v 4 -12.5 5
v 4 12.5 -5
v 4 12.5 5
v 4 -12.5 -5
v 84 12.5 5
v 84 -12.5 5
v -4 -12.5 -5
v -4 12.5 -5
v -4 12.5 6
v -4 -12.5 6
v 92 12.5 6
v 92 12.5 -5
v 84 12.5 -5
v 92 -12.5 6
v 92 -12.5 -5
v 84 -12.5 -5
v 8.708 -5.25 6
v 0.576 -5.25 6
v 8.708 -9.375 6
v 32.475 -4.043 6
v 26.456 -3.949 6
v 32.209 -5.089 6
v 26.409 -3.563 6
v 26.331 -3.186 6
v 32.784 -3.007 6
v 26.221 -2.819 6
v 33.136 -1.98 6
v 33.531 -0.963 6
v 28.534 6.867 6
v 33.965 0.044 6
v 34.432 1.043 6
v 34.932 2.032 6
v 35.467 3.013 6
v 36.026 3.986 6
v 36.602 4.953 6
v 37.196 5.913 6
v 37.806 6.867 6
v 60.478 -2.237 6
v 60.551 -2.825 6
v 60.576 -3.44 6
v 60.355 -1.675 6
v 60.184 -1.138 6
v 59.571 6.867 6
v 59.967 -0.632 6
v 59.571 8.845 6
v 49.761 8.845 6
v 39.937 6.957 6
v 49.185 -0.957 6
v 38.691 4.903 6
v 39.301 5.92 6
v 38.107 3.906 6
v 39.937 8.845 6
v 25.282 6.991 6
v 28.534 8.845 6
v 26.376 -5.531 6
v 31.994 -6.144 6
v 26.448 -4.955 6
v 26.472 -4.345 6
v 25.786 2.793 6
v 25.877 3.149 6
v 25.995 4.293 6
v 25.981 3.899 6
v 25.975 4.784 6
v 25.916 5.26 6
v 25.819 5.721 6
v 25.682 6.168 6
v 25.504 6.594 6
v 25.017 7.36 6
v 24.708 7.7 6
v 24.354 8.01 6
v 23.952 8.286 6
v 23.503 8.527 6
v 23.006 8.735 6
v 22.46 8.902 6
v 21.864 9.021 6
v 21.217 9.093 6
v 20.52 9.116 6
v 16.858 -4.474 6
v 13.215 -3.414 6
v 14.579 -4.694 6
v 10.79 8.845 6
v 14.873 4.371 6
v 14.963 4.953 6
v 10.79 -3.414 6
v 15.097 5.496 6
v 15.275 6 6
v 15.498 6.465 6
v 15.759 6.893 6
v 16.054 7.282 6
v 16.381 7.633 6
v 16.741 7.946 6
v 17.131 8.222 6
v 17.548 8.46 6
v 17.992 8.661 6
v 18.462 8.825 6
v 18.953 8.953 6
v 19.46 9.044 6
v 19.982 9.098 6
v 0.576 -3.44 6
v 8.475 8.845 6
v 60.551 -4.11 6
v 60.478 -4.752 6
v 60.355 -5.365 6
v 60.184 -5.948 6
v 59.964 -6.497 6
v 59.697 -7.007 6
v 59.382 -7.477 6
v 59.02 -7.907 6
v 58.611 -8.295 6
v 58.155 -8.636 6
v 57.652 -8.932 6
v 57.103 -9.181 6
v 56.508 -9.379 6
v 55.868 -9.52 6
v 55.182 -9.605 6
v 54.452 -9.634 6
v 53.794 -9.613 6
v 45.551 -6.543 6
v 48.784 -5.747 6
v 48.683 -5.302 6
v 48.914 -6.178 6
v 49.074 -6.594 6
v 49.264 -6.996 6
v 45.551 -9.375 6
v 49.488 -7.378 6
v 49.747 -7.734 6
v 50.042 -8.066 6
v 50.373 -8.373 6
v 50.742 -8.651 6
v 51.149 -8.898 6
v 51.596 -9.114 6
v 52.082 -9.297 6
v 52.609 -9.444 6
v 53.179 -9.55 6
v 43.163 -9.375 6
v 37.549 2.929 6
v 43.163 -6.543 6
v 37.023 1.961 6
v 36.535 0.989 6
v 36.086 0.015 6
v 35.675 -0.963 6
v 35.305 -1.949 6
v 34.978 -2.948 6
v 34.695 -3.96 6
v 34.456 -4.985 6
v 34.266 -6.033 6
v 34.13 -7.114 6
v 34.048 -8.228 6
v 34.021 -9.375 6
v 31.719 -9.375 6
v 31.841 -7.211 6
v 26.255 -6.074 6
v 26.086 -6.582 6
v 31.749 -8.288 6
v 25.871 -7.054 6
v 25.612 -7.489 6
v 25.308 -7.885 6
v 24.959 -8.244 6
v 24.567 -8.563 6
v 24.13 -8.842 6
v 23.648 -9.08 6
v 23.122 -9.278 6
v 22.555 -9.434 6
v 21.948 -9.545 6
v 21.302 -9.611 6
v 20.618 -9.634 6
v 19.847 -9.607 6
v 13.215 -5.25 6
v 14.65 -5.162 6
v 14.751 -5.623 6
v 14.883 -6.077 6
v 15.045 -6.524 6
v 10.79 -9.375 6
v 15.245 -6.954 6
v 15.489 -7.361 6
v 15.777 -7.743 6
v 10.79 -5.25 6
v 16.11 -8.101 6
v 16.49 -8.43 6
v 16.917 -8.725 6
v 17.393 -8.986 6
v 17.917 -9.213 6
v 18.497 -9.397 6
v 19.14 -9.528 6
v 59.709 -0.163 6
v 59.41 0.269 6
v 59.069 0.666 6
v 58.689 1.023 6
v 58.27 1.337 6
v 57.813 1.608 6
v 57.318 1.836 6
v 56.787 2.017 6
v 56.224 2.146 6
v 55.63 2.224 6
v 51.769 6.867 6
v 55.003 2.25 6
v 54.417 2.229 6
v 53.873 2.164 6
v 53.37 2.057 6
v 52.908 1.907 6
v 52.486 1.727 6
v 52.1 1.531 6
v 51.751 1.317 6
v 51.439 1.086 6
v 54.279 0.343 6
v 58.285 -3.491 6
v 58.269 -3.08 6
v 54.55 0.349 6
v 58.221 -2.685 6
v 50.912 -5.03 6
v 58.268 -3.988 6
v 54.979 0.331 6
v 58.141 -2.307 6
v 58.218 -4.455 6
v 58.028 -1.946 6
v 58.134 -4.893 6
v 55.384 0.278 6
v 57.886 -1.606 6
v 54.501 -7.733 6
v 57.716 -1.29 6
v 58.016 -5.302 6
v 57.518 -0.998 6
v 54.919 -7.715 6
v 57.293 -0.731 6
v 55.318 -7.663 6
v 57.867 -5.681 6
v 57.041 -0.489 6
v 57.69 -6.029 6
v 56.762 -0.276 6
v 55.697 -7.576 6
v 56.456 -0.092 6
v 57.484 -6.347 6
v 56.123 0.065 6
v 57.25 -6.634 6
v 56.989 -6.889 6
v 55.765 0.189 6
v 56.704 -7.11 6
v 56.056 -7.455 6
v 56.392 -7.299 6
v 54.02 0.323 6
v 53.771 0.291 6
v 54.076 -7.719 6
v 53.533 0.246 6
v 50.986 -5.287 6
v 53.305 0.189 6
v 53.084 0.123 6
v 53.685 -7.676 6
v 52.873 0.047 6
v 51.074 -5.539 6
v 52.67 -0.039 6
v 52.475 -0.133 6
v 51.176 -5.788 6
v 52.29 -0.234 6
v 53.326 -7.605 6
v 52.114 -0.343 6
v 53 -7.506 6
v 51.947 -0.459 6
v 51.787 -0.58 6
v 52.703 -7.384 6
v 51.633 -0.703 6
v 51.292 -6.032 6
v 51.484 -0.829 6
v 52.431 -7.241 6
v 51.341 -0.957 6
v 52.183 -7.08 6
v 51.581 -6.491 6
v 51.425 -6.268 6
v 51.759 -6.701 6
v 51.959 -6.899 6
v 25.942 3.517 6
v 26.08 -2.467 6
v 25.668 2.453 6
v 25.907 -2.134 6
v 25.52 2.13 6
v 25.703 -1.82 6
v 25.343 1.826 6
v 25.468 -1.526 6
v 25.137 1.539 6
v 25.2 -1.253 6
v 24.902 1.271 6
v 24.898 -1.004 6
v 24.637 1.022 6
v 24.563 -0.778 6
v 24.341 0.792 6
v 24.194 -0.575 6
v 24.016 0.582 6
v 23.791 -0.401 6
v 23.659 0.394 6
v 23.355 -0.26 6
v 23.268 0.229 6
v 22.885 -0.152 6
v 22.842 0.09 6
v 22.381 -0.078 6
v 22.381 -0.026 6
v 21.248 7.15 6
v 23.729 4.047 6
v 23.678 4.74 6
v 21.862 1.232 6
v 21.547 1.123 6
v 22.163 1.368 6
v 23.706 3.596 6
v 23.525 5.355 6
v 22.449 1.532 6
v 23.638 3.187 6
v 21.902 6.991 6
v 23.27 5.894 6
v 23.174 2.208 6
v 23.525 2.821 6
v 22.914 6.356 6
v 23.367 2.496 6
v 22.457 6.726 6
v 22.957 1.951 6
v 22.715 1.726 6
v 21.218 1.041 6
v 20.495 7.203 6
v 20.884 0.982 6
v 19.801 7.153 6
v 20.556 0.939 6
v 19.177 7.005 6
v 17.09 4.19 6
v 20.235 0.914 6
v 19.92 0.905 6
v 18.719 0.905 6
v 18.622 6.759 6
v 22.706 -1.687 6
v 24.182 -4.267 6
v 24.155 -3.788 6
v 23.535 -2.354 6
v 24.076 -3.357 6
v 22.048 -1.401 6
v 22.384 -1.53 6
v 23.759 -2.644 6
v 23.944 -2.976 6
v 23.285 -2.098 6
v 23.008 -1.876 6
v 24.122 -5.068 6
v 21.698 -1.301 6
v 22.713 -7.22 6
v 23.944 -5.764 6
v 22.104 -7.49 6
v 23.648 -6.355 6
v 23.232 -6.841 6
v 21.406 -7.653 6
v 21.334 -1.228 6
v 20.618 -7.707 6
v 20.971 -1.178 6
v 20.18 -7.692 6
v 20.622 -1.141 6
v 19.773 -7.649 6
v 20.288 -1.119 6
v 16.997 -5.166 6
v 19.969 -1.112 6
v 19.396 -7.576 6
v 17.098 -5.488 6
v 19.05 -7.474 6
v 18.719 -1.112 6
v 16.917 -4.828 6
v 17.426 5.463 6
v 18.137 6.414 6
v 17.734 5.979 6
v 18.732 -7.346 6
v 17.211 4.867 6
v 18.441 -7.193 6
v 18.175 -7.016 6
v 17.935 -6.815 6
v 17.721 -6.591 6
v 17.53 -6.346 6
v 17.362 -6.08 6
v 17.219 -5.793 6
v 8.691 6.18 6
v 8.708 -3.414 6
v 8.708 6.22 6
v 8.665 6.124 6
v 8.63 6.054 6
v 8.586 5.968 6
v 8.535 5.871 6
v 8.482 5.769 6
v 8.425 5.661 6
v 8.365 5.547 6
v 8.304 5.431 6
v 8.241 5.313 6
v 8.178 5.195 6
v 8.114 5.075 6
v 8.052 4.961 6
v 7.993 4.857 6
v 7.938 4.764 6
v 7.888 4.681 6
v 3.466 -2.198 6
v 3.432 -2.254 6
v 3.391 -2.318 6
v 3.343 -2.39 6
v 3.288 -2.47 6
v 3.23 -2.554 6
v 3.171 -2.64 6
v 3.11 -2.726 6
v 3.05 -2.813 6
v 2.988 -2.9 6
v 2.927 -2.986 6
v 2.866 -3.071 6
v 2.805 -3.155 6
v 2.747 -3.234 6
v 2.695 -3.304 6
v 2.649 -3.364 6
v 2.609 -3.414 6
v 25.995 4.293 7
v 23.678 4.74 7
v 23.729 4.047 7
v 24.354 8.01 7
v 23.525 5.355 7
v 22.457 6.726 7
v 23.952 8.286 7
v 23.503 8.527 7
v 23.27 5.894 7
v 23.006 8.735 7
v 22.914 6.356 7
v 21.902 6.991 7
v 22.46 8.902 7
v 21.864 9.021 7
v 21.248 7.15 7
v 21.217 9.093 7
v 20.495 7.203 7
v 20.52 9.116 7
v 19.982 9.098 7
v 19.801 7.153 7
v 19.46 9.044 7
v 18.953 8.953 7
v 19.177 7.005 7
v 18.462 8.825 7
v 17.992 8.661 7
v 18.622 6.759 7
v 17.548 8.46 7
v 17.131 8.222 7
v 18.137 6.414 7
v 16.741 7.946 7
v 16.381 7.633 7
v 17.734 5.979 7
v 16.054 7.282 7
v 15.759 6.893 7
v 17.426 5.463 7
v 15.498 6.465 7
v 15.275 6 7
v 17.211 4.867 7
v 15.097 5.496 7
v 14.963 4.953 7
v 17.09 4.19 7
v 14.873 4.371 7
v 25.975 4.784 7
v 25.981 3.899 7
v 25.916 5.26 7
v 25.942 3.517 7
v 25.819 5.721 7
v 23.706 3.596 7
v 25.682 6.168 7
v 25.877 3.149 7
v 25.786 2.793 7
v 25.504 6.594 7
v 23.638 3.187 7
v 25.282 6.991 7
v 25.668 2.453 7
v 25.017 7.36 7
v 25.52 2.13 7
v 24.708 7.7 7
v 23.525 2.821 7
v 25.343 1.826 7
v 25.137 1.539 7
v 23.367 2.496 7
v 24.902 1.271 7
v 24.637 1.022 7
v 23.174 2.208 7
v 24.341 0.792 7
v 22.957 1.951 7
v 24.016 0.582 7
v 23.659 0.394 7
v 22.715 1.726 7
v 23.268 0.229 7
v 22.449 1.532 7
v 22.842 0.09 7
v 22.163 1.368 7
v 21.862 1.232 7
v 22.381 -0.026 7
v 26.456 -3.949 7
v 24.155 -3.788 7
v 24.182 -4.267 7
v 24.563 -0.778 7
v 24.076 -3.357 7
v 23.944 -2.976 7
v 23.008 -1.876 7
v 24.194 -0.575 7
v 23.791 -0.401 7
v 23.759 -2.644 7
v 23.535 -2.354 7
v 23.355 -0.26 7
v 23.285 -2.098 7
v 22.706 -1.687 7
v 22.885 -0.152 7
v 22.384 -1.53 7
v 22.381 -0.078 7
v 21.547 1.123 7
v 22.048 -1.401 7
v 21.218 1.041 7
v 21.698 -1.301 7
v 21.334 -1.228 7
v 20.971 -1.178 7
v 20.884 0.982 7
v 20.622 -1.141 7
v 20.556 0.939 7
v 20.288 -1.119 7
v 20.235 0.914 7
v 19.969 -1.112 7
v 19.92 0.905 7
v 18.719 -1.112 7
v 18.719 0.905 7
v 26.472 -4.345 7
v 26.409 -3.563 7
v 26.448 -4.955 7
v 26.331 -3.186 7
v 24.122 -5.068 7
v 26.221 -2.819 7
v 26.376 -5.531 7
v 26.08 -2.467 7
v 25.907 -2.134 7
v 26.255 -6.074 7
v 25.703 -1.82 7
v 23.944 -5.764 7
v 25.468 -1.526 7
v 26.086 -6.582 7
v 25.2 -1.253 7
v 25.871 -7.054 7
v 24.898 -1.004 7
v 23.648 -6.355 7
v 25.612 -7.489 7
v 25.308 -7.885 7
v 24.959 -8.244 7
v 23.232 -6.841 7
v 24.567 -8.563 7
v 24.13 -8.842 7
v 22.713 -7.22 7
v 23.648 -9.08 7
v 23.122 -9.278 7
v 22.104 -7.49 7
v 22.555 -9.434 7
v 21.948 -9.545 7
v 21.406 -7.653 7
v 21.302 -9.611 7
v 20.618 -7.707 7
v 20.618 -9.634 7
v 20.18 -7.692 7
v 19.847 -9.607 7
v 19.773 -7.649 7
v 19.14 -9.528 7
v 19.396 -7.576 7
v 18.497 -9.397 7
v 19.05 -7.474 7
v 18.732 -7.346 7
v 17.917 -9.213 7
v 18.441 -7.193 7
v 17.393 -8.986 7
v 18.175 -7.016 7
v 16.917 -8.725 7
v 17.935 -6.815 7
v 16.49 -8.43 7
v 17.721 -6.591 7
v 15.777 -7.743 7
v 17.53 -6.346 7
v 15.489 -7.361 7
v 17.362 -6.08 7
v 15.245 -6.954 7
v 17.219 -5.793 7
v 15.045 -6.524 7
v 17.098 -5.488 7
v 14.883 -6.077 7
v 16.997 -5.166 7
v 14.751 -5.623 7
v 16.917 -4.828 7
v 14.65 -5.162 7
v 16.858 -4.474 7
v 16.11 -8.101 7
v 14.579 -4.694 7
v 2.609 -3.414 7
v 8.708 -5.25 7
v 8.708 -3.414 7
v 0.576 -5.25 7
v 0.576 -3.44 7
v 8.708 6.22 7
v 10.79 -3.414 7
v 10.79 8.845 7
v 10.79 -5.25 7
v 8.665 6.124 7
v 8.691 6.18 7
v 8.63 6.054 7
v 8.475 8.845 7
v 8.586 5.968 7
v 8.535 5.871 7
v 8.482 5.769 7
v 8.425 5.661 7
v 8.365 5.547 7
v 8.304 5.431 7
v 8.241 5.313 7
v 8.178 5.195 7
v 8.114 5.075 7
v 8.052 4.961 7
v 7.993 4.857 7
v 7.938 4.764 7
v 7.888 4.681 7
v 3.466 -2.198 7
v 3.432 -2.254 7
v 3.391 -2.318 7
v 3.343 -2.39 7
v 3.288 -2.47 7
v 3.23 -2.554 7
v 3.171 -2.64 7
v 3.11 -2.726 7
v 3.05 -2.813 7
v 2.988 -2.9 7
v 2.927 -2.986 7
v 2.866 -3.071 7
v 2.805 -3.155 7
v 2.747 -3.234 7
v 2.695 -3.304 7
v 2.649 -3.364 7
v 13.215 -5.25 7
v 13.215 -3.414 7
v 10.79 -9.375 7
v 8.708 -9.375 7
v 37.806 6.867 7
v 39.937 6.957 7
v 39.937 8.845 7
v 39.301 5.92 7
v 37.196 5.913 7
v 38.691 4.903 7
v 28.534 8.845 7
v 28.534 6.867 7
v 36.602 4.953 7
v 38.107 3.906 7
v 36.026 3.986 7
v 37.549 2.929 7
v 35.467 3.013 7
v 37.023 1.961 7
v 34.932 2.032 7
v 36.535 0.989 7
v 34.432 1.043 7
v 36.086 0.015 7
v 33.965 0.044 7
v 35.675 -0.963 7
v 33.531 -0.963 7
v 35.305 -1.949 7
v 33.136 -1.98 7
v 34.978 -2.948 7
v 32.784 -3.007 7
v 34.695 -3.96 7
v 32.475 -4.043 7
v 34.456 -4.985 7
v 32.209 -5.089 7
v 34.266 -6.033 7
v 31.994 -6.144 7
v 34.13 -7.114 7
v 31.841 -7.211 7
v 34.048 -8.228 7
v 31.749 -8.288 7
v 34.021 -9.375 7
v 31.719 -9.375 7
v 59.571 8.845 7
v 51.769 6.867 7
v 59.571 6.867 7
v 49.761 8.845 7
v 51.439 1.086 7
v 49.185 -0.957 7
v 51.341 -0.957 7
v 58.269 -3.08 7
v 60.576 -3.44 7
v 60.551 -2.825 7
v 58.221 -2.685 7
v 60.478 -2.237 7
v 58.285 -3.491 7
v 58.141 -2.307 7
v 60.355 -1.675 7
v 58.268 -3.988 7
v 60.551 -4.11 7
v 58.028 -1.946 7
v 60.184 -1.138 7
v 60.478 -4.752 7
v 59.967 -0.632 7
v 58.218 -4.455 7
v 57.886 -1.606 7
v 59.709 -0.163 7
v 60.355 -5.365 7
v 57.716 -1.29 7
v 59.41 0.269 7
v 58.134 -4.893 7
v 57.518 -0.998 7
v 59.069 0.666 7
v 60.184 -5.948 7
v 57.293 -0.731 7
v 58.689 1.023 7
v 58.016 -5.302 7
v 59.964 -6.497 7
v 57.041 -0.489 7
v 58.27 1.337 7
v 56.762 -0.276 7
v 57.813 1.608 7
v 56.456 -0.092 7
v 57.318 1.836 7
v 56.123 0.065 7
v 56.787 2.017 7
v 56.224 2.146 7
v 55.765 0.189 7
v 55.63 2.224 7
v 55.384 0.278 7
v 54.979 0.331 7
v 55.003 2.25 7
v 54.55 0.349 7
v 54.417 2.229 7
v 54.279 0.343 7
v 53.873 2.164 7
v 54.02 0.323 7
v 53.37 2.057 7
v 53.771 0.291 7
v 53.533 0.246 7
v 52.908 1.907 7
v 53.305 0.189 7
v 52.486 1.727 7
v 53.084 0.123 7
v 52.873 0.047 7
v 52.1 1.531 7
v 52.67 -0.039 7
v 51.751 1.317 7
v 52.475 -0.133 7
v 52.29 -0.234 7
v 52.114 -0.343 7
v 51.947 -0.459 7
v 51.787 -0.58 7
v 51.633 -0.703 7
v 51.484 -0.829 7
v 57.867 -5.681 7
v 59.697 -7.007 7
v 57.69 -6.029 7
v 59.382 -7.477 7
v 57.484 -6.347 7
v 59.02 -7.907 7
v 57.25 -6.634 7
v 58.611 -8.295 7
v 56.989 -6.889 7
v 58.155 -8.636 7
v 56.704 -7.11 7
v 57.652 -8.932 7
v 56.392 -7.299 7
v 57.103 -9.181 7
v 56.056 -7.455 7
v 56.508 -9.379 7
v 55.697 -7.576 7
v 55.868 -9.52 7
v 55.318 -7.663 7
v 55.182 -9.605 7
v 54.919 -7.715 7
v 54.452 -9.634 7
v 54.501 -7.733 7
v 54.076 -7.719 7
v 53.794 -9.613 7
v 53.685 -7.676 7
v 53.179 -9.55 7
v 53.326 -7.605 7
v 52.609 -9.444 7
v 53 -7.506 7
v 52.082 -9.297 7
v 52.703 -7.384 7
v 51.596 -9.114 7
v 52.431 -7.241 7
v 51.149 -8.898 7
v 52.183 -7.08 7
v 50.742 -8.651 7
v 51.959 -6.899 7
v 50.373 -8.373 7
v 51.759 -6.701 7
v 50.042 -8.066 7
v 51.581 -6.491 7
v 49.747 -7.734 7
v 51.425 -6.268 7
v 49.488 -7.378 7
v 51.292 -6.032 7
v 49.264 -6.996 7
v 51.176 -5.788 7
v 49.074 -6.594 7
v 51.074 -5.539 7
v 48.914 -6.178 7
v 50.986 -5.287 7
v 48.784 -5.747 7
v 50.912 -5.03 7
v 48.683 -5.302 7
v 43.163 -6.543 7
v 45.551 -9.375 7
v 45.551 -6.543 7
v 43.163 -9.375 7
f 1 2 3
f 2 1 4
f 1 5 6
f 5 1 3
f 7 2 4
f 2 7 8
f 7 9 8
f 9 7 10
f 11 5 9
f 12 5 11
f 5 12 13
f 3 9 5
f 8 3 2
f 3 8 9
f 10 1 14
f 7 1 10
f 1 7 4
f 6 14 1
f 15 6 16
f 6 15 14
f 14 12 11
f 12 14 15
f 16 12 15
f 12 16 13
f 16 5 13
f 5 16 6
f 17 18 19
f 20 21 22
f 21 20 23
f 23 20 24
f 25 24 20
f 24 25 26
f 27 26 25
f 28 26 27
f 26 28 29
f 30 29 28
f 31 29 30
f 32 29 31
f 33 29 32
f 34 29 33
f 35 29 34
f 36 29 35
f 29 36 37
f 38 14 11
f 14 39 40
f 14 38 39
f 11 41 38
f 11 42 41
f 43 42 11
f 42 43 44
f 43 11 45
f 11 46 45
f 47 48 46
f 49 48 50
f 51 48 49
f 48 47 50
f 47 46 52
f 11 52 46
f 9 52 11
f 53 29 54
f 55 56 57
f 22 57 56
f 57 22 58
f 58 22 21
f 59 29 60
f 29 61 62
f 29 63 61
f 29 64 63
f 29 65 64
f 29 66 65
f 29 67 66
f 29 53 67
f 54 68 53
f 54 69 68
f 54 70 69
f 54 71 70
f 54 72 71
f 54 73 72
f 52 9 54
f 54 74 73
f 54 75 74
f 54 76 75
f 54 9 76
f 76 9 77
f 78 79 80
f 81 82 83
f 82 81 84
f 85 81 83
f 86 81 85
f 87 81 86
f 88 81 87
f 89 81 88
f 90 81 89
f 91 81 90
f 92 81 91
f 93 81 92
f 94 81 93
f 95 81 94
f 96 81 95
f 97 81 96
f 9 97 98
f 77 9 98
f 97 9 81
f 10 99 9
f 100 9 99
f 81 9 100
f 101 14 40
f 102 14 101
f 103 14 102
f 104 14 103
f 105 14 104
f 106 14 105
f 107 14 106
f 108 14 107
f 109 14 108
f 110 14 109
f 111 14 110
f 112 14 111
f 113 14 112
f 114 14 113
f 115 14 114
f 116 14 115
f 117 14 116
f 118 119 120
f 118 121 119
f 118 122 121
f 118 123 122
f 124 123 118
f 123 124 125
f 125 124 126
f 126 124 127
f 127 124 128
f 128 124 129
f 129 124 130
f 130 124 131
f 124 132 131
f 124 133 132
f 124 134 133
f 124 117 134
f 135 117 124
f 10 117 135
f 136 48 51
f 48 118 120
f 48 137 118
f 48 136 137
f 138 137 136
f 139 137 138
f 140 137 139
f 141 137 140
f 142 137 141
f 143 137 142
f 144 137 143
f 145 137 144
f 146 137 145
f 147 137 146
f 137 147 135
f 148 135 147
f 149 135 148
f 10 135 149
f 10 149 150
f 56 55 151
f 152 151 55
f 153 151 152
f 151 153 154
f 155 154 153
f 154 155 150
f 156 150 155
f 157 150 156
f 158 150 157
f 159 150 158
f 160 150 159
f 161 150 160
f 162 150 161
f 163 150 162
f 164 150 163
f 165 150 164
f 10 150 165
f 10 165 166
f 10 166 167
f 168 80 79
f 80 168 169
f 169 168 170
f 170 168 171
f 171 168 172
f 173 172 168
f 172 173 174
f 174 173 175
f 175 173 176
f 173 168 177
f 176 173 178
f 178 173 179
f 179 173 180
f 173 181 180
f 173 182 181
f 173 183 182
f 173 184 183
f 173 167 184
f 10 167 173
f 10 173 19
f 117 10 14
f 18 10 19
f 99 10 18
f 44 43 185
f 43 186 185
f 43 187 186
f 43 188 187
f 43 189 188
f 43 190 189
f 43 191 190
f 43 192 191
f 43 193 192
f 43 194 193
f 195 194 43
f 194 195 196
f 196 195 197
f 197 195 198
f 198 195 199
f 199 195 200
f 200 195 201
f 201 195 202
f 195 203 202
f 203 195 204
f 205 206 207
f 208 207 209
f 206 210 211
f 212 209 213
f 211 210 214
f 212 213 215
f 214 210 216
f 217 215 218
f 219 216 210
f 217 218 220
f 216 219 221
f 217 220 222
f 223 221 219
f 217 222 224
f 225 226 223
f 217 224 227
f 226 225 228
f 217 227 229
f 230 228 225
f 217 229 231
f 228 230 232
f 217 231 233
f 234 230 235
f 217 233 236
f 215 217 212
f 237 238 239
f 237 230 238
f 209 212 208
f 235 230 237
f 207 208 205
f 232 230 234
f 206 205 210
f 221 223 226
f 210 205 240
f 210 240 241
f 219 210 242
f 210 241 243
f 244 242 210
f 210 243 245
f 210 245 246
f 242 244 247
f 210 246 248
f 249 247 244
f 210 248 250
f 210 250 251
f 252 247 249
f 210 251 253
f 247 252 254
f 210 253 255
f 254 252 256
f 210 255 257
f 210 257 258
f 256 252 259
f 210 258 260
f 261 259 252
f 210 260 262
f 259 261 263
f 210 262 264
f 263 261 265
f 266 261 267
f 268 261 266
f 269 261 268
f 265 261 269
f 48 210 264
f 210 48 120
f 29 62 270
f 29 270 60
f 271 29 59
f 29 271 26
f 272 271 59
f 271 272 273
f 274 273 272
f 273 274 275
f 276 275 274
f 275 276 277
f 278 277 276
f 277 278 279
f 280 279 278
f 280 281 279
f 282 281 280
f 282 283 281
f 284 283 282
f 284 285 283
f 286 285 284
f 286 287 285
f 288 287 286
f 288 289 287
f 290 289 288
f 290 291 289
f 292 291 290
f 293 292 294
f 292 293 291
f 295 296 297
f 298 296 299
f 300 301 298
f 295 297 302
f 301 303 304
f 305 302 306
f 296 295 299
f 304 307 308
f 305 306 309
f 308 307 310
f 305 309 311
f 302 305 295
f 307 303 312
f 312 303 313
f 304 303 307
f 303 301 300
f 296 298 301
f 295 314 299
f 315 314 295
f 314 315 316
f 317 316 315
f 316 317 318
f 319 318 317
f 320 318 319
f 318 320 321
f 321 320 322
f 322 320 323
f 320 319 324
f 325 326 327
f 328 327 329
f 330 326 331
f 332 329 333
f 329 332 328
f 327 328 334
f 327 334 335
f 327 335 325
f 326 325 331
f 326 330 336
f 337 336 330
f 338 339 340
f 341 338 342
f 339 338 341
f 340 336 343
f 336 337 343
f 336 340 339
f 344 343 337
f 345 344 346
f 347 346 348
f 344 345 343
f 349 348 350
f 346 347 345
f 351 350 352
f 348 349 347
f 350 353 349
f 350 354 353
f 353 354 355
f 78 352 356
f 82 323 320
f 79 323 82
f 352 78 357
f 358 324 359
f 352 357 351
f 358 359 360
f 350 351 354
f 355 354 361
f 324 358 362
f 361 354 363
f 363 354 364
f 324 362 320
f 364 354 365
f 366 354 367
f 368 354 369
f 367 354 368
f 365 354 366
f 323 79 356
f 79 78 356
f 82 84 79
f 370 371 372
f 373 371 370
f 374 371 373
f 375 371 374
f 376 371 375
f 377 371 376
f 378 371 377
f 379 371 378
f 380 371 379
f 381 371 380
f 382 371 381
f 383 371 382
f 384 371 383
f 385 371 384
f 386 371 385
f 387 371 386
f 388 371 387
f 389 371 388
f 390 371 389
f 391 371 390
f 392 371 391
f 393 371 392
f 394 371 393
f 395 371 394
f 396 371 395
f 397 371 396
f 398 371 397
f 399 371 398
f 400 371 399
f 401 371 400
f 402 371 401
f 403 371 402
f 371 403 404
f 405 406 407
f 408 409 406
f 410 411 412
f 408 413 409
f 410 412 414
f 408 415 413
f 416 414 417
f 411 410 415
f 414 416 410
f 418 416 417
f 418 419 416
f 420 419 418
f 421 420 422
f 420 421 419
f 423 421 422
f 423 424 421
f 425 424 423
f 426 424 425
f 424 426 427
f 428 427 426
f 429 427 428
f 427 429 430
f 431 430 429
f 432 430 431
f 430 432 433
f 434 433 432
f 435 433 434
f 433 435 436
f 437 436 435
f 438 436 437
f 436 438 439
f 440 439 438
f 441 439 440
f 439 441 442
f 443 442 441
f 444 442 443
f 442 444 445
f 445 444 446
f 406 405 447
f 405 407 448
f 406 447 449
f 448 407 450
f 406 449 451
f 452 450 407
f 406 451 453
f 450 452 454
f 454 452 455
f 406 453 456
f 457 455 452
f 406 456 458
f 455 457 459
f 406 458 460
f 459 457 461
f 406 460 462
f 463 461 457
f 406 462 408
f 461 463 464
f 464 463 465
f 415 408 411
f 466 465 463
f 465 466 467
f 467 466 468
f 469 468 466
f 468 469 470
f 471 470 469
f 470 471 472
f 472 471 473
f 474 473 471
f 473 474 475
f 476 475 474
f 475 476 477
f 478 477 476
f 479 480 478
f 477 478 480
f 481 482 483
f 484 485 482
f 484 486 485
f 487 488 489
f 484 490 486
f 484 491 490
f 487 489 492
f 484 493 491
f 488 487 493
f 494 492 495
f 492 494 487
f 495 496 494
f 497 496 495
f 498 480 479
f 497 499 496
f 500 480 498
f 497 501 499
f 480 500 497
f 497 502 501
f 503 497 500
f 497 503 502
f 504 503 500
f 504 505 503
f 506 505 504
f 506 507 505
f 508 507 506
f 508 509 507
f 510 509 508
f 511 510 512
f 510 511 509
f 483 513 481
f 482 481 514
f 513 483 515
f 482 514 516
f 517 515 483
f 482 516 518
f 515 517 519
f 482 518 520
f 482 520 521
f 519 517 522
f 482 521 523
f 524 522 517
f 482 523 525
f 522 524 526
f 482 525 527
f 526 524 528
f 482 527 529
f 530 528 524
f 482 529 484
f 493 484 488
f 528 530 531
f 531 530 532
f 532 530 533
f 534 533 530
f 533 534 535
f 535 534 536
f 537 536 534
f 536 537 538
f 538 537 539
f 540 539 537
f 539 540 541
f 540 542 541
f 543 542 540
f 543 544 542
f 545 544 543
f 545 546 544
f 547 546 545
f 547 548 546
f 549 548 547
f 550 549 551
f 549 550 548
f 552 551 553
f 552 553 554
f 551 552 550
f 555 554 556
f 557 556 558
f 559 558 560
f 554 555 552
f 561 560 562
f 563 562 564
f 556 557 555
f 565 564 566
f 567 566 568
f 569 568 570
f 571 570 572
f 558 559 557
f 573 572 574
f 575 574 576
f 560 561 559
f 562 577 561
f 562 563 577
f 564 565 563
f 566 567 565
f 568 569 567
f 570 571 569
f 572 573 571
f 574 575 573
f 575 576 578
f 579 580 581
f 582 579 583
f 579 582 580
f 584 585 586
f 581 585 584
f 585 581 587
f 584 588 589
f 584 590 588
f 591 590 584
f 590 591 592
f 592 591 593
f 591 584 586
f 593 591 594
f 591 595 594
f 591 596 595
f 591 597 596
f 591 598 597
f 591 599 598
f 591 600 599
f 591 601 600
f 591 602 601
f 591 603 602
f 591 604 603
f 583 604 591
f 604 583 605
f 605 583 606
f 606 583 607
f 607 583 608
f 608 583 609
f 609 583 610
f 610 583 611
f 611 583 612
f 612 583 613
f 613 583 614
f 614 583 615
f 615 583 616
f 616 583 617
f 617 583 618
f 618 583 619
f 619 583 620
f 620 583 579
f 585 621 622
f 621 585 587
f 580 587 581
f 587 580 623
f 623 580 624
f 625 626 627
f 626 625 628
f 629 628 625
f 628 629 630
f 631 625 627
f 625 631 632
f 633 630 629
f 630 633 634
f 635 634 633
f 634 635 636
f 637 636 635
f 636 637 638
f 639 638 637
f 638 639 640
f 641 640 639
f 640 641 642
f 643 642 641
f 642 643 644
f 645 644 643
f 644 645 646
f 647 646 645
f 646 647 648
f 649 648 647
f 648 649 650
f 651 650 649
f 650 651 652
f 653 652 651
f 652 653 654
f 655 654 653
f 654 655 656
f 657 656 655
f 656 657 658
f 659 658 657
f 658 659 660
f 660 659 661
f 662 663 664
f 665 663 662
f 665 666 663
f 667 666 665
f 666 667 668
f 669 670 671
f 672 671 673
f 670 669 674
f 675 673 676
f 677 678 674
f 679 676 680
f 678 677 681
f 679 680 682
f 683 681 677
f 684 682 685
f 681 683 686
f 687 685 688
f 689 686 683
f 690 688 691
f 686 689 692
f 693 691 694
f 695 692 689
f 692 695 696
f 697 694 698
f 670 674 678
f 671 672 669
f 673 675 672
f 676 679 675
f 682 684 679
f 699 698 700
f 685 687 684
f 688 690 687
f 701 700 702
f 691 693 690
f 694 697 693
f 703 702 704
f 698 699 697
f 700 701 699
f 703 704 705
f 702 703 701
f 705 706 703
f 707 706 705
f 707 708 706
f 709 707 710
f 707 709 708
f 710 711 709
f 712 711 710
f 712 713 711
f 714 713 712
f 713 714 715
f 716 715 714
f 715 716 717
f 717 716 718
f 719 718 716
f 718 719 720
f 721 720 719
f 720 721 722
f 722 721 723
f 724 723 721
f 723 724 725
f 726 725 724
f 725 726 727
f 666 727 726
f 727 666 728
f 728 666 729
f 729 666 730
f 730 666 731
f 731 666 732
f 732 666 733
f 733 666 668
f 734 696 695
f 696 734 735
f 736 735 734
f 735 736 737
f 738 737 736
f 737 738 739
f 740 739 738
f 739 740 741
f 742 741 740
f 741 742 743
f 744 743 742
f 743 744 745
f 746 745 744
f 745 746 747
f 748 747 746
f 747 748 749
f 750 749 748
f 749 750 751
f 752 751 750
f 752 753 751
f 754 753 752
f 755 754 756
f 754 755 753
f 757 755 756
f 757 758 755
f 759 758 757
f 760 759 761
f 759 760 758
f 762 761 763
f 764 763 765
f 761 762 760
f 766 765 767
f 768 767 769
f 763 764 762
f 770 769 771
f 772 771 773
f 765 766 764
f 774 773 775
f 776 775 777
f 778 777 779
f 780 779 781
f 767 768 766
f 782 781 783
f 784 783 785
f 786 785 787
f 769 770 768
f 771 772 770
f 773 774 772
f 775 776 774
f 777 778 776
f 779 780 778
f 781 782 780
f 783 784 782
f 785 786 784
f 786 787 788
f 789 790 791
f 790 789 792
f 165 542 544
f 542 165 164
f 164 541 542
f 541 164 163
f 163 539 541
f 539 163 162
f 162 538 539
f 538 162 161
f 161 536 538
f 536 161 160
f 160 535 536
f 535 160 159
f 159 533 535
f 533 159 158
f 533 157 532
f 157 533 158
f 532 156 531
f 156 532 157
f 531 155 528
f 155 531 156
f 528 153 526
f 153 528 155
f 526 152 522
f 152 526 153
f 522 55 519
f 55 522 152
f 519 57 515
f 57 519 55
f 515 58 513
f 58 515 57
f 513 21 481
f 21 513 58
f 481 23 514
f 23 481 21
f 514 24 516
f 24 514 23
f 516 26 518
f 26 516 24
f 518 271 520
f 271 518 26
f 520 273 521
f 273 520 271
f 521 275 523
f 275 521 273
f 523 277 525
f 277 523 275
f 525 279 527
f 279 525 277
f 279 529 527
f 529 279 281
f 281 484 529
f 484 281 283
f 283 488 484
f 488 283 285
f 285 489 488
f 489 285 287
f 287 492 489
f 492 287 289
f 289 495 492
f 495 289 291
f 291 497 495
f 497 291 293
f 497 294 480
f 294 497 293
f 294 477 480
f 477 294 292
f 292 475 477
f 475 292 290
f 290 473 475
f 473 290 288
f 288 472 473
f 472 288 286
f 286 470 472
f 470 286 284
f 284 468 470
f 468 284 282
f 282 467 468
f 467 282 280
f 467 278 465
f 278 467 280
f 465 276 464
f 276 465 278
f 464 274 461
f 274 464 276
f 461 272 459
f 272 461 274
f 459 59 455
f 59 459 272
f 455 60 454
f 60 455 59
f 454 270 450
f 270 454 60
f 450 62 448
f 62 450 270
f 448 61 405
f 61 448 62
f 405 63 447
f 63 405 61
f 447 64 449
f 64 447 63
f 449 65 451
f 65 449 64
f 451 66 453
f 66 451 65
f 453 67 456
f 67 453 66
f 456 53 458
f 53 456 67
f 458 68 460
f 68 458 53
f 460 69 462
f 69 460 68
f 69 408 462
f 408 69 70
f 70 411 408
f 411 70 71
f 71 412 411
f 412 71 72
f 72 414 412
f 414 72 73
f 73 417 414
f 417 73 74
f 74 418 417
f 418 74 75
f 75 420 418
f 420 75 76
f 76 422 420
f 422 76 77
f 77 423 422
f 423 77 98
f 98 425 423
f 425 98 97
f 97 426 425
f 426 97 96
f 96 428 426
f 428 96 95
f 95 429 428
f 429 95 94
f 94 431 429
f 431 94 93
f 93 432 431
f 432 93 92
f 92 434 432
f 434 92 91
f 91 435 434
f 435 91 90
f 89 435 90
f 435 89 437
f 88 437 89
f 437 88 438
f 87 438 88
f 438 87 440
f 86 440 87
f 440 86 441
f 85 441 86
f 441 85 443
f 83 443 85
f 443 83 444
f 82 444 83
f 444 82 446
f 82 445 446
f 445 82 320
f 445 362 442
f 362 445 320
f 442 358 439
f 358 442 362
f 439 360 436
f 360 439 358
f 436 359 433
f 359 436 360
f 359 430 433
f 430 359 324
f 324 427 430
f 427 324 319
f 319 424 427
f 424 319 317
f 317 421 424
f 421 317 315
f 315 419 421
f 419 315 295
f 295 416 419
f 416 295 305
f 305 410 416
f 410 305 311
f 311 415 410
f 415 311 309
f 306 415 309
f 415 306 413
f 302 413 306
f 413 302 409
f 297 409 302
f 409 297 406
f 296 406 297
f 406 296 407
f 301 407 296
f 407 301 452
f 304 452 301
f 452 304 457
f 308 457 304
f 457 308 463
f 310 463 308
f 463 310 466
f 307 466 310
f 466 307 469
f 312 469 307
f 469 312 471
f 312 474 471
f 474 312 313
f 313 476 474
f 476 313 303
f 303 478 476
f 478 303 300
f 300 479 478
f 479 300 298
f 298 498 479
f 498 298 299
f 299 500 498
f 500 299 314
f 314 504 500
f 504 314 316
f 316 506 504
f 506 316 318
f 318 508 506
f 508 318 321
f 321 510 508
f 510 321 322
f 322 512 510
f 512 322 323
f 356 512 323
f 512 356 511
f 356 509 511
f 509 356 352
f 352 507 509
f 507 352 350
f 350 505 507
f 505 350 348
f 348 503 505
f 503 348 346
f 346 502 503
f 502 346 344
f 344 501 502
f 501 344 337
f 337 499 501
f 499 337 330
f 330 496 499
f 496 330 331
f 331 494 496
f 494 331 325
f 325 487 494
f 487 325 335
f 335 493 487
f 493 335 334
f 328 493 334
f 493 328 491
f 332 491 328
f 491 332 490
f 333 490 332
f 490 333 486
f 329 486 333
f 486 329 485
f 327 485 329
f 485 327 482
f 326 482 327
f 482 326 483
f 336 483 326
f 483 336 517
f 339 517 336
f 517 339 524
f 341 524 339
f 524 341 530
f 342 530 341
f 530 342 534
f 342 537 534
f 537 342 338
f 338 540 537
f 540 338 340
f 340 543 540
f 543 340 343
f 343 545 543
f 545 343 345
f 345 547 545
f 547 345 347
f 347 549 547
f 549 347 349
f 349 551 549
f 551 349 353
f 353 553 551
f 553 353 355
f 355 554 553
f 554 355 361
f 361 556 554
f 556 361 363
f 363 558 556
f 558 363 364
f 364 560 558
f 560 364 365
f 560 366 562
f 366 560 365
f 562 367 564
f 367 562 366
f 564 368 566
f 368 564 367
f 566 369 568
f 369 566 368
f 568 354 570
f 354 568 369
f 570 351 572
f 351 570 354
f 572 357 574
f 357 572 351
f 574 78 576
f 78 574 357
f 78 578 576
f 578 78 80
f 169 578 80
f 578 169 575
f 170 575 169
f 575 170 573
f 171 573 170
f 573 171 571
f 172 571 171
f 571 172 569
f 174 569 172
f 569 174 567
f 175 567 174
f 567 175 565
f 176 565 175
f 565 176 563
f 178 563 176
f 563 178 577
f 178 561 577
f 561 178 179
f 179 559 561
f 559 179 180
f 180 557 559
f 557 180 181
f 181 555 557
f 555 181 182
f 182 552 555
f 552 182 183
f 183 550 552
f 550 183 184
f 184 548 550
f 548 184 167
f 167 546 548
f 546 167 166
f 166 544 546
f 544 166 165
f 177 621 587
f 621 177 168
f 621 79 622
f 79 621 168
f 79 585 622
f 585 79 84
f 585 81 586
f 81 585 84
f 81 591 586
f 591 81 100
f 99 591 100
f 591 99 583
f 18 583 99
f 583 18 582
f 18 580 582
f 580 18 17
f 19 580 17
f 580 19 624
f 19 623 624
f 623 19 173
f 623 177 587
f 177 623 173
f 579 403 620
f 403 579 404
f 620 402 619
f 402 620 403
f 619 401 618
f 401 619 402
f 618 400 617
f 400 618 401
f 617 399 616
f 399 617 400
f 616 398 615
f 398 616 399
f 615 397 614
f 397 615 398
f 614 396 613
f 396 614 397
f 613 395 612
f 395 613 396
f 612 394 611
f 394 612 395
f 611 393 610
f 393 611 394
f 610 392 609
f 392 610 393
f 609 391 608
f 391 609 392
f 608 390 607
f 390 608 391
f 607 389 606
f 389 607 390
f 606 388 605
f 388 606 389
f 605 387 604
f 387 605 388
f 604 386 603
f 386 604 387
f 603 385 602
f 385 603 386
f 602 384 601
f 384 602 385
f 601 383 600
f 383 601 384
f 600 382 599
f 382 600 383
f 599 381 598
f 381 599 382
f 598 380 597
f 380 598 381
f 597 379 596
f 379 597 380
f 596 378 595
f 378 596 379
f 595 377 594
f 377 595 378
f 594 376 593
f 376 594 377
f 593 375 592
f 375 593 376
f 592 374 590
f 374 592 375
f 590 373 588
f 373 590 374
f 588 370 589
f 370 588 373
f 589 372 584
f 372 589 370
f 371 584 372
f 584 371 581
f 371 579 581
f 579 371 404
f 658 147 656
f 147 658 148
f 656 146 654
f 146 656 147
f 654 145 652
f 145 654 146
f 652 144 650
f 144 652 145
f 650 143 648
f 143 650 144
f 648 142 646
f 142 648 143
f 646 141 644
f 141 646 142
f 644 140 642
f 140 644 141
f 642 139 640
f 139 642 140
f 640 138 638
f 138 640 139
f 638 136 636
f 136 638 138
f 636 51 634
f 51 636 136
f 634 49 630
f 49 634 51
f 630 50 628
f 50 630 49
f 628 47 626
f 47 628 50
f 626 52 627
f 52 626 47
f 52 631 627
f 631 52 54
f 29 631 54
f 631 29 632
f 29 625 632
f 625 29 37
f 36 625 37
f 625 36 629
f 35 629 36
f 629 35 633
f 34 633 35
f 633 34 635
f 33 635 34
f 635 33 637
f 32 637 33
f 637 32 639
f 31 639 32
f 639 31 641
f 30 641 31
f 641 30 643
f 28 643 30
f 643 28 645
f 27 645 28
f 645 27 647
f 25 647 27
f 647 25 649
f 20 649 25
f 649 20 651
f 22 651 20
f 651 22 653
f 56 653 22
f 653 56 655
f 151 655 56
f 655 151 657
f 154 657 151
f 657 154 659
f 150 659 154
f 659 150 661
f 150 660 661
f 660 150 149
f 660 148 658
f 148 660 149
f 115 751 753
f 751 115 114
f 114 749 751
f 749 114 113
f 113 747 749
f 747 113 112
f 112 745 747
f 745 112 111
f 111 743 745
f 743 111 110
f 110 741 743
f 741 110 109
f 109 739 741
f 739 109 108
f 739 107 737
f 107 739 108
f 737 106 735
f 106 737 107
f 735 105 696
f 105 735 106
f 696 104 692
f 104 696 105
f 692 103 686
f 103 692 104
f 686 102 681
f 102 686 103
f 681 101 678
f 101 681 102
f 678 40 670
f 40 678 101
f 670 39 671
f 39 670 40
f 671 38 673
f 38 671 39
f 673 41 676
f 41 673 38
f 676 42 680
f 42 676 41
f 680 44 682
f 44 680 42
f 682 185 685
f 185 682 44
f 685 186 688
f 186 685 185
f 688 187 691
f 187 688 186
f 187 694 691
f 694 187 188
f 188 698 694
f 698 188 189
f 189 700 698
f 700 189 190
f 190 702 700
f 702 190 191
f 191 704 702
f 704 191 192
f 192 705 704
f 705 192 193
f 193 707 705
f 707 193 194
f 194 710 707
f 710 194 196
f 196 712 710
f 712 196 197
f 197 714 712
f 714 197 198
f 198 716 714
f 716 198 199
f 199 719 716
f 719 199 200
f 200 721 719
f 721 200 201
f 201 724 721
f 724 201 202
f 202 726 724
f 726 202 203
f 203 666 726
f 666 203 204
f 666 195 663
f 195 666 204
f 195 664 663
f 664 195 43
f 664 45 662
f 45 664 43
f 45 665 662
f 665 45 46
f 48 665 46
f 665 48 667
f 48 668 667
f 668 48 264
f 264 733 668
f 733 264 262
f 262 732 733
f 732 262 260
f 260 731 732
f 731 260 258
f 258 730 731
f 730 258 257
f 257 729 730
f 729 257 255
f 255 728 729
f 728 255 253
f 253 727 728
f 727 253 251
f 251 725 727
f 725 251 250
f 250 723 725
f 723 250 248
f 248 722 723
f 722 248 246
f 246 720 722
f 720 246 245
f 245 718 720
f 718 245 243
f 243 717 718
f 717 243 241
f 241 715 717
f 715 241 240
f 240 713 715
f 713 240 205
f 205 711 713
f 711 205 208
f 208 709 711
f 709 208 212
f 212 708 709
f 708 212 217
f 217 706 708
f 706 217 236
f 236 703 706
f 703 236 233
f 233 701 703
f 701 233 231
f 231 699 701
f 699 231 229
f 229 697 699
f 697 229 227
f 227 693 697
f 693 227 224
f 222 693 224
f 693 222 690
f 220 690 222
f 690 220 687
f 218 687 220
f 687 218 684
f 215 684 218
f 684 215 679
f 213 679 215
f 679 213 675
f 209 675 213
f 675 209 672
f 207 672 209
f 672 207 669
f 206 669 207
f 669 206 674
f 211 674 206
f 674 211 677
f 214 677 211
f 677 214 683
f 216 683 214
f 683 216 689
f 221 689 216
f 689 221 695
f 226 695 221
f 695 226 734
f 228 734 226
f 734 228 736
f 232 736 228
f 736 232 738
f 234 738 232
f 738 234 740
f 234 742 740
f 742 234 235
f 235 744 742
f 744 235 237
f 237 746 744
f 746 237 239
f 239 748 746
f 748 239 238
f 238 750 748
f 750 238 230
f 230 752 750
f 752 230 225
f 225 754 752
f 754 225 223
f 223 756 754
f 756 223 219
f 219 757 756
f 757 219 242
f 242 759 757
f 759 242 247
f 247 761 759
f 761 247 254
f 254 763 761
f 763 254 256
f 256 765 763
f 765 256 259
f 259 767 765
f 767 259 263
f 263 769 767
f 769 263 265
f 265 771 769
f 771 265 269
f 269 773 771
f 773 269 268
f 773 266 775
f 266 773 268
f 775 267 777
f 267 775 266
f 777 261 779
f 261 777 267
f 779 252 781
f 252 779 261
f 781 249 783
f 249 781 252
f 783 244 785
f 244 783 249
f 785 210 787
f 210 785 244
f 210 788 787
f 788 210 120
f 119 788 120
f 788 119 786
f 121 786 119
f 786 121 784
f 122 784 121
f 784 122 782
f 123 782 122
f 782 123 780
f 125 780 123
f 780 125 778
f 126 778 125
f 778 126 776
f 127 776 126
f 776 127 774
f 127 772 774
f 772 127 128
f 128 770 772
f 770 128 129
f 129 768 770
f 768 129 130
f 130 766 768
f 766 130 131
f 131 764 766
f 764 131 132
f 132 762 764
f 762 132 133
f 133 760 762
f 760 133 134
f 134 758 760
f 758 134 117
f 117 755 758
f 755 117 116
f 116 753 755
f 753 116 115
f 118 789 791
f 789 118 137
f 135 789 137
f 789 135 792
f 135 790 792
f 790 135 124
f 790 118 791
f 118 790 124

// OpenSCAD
// Width of bridge
width = 25; // [10:180]

// Length of bridge
length = 80; // [10:180]

module bridge(
    width = 25,
    length = 80
    ){
    
    //Do not modified these constants
    height = 10;
    base = 8;
    bridge_thick = 1;
    length_score = 5;
    width_score = 1.5;
    magic = 0.75; 
        
    cube([base,width,height],center=true);
    translate([length+base,0,0])cube([base,width,height],center=true);
    color("red") translate([length/2+base/2,0,height/2+bridge_thick/2])cube([length+2*base,width,bridge_thick],center=true);
       
    finalScore = (width * width_score) + (length * length_score);
    echo(str("Congratulation you received " , finalScore , " points"));
        
    mySize = (width > length) ? length : width;
    translate([0,-width/2*magic,height/2+bridge_thick])    resize([length*magic,width*magic,1]) linear_extrude(height = magic)text(str(finalScore), size=mySize/2);
}


bridge(width,length);
